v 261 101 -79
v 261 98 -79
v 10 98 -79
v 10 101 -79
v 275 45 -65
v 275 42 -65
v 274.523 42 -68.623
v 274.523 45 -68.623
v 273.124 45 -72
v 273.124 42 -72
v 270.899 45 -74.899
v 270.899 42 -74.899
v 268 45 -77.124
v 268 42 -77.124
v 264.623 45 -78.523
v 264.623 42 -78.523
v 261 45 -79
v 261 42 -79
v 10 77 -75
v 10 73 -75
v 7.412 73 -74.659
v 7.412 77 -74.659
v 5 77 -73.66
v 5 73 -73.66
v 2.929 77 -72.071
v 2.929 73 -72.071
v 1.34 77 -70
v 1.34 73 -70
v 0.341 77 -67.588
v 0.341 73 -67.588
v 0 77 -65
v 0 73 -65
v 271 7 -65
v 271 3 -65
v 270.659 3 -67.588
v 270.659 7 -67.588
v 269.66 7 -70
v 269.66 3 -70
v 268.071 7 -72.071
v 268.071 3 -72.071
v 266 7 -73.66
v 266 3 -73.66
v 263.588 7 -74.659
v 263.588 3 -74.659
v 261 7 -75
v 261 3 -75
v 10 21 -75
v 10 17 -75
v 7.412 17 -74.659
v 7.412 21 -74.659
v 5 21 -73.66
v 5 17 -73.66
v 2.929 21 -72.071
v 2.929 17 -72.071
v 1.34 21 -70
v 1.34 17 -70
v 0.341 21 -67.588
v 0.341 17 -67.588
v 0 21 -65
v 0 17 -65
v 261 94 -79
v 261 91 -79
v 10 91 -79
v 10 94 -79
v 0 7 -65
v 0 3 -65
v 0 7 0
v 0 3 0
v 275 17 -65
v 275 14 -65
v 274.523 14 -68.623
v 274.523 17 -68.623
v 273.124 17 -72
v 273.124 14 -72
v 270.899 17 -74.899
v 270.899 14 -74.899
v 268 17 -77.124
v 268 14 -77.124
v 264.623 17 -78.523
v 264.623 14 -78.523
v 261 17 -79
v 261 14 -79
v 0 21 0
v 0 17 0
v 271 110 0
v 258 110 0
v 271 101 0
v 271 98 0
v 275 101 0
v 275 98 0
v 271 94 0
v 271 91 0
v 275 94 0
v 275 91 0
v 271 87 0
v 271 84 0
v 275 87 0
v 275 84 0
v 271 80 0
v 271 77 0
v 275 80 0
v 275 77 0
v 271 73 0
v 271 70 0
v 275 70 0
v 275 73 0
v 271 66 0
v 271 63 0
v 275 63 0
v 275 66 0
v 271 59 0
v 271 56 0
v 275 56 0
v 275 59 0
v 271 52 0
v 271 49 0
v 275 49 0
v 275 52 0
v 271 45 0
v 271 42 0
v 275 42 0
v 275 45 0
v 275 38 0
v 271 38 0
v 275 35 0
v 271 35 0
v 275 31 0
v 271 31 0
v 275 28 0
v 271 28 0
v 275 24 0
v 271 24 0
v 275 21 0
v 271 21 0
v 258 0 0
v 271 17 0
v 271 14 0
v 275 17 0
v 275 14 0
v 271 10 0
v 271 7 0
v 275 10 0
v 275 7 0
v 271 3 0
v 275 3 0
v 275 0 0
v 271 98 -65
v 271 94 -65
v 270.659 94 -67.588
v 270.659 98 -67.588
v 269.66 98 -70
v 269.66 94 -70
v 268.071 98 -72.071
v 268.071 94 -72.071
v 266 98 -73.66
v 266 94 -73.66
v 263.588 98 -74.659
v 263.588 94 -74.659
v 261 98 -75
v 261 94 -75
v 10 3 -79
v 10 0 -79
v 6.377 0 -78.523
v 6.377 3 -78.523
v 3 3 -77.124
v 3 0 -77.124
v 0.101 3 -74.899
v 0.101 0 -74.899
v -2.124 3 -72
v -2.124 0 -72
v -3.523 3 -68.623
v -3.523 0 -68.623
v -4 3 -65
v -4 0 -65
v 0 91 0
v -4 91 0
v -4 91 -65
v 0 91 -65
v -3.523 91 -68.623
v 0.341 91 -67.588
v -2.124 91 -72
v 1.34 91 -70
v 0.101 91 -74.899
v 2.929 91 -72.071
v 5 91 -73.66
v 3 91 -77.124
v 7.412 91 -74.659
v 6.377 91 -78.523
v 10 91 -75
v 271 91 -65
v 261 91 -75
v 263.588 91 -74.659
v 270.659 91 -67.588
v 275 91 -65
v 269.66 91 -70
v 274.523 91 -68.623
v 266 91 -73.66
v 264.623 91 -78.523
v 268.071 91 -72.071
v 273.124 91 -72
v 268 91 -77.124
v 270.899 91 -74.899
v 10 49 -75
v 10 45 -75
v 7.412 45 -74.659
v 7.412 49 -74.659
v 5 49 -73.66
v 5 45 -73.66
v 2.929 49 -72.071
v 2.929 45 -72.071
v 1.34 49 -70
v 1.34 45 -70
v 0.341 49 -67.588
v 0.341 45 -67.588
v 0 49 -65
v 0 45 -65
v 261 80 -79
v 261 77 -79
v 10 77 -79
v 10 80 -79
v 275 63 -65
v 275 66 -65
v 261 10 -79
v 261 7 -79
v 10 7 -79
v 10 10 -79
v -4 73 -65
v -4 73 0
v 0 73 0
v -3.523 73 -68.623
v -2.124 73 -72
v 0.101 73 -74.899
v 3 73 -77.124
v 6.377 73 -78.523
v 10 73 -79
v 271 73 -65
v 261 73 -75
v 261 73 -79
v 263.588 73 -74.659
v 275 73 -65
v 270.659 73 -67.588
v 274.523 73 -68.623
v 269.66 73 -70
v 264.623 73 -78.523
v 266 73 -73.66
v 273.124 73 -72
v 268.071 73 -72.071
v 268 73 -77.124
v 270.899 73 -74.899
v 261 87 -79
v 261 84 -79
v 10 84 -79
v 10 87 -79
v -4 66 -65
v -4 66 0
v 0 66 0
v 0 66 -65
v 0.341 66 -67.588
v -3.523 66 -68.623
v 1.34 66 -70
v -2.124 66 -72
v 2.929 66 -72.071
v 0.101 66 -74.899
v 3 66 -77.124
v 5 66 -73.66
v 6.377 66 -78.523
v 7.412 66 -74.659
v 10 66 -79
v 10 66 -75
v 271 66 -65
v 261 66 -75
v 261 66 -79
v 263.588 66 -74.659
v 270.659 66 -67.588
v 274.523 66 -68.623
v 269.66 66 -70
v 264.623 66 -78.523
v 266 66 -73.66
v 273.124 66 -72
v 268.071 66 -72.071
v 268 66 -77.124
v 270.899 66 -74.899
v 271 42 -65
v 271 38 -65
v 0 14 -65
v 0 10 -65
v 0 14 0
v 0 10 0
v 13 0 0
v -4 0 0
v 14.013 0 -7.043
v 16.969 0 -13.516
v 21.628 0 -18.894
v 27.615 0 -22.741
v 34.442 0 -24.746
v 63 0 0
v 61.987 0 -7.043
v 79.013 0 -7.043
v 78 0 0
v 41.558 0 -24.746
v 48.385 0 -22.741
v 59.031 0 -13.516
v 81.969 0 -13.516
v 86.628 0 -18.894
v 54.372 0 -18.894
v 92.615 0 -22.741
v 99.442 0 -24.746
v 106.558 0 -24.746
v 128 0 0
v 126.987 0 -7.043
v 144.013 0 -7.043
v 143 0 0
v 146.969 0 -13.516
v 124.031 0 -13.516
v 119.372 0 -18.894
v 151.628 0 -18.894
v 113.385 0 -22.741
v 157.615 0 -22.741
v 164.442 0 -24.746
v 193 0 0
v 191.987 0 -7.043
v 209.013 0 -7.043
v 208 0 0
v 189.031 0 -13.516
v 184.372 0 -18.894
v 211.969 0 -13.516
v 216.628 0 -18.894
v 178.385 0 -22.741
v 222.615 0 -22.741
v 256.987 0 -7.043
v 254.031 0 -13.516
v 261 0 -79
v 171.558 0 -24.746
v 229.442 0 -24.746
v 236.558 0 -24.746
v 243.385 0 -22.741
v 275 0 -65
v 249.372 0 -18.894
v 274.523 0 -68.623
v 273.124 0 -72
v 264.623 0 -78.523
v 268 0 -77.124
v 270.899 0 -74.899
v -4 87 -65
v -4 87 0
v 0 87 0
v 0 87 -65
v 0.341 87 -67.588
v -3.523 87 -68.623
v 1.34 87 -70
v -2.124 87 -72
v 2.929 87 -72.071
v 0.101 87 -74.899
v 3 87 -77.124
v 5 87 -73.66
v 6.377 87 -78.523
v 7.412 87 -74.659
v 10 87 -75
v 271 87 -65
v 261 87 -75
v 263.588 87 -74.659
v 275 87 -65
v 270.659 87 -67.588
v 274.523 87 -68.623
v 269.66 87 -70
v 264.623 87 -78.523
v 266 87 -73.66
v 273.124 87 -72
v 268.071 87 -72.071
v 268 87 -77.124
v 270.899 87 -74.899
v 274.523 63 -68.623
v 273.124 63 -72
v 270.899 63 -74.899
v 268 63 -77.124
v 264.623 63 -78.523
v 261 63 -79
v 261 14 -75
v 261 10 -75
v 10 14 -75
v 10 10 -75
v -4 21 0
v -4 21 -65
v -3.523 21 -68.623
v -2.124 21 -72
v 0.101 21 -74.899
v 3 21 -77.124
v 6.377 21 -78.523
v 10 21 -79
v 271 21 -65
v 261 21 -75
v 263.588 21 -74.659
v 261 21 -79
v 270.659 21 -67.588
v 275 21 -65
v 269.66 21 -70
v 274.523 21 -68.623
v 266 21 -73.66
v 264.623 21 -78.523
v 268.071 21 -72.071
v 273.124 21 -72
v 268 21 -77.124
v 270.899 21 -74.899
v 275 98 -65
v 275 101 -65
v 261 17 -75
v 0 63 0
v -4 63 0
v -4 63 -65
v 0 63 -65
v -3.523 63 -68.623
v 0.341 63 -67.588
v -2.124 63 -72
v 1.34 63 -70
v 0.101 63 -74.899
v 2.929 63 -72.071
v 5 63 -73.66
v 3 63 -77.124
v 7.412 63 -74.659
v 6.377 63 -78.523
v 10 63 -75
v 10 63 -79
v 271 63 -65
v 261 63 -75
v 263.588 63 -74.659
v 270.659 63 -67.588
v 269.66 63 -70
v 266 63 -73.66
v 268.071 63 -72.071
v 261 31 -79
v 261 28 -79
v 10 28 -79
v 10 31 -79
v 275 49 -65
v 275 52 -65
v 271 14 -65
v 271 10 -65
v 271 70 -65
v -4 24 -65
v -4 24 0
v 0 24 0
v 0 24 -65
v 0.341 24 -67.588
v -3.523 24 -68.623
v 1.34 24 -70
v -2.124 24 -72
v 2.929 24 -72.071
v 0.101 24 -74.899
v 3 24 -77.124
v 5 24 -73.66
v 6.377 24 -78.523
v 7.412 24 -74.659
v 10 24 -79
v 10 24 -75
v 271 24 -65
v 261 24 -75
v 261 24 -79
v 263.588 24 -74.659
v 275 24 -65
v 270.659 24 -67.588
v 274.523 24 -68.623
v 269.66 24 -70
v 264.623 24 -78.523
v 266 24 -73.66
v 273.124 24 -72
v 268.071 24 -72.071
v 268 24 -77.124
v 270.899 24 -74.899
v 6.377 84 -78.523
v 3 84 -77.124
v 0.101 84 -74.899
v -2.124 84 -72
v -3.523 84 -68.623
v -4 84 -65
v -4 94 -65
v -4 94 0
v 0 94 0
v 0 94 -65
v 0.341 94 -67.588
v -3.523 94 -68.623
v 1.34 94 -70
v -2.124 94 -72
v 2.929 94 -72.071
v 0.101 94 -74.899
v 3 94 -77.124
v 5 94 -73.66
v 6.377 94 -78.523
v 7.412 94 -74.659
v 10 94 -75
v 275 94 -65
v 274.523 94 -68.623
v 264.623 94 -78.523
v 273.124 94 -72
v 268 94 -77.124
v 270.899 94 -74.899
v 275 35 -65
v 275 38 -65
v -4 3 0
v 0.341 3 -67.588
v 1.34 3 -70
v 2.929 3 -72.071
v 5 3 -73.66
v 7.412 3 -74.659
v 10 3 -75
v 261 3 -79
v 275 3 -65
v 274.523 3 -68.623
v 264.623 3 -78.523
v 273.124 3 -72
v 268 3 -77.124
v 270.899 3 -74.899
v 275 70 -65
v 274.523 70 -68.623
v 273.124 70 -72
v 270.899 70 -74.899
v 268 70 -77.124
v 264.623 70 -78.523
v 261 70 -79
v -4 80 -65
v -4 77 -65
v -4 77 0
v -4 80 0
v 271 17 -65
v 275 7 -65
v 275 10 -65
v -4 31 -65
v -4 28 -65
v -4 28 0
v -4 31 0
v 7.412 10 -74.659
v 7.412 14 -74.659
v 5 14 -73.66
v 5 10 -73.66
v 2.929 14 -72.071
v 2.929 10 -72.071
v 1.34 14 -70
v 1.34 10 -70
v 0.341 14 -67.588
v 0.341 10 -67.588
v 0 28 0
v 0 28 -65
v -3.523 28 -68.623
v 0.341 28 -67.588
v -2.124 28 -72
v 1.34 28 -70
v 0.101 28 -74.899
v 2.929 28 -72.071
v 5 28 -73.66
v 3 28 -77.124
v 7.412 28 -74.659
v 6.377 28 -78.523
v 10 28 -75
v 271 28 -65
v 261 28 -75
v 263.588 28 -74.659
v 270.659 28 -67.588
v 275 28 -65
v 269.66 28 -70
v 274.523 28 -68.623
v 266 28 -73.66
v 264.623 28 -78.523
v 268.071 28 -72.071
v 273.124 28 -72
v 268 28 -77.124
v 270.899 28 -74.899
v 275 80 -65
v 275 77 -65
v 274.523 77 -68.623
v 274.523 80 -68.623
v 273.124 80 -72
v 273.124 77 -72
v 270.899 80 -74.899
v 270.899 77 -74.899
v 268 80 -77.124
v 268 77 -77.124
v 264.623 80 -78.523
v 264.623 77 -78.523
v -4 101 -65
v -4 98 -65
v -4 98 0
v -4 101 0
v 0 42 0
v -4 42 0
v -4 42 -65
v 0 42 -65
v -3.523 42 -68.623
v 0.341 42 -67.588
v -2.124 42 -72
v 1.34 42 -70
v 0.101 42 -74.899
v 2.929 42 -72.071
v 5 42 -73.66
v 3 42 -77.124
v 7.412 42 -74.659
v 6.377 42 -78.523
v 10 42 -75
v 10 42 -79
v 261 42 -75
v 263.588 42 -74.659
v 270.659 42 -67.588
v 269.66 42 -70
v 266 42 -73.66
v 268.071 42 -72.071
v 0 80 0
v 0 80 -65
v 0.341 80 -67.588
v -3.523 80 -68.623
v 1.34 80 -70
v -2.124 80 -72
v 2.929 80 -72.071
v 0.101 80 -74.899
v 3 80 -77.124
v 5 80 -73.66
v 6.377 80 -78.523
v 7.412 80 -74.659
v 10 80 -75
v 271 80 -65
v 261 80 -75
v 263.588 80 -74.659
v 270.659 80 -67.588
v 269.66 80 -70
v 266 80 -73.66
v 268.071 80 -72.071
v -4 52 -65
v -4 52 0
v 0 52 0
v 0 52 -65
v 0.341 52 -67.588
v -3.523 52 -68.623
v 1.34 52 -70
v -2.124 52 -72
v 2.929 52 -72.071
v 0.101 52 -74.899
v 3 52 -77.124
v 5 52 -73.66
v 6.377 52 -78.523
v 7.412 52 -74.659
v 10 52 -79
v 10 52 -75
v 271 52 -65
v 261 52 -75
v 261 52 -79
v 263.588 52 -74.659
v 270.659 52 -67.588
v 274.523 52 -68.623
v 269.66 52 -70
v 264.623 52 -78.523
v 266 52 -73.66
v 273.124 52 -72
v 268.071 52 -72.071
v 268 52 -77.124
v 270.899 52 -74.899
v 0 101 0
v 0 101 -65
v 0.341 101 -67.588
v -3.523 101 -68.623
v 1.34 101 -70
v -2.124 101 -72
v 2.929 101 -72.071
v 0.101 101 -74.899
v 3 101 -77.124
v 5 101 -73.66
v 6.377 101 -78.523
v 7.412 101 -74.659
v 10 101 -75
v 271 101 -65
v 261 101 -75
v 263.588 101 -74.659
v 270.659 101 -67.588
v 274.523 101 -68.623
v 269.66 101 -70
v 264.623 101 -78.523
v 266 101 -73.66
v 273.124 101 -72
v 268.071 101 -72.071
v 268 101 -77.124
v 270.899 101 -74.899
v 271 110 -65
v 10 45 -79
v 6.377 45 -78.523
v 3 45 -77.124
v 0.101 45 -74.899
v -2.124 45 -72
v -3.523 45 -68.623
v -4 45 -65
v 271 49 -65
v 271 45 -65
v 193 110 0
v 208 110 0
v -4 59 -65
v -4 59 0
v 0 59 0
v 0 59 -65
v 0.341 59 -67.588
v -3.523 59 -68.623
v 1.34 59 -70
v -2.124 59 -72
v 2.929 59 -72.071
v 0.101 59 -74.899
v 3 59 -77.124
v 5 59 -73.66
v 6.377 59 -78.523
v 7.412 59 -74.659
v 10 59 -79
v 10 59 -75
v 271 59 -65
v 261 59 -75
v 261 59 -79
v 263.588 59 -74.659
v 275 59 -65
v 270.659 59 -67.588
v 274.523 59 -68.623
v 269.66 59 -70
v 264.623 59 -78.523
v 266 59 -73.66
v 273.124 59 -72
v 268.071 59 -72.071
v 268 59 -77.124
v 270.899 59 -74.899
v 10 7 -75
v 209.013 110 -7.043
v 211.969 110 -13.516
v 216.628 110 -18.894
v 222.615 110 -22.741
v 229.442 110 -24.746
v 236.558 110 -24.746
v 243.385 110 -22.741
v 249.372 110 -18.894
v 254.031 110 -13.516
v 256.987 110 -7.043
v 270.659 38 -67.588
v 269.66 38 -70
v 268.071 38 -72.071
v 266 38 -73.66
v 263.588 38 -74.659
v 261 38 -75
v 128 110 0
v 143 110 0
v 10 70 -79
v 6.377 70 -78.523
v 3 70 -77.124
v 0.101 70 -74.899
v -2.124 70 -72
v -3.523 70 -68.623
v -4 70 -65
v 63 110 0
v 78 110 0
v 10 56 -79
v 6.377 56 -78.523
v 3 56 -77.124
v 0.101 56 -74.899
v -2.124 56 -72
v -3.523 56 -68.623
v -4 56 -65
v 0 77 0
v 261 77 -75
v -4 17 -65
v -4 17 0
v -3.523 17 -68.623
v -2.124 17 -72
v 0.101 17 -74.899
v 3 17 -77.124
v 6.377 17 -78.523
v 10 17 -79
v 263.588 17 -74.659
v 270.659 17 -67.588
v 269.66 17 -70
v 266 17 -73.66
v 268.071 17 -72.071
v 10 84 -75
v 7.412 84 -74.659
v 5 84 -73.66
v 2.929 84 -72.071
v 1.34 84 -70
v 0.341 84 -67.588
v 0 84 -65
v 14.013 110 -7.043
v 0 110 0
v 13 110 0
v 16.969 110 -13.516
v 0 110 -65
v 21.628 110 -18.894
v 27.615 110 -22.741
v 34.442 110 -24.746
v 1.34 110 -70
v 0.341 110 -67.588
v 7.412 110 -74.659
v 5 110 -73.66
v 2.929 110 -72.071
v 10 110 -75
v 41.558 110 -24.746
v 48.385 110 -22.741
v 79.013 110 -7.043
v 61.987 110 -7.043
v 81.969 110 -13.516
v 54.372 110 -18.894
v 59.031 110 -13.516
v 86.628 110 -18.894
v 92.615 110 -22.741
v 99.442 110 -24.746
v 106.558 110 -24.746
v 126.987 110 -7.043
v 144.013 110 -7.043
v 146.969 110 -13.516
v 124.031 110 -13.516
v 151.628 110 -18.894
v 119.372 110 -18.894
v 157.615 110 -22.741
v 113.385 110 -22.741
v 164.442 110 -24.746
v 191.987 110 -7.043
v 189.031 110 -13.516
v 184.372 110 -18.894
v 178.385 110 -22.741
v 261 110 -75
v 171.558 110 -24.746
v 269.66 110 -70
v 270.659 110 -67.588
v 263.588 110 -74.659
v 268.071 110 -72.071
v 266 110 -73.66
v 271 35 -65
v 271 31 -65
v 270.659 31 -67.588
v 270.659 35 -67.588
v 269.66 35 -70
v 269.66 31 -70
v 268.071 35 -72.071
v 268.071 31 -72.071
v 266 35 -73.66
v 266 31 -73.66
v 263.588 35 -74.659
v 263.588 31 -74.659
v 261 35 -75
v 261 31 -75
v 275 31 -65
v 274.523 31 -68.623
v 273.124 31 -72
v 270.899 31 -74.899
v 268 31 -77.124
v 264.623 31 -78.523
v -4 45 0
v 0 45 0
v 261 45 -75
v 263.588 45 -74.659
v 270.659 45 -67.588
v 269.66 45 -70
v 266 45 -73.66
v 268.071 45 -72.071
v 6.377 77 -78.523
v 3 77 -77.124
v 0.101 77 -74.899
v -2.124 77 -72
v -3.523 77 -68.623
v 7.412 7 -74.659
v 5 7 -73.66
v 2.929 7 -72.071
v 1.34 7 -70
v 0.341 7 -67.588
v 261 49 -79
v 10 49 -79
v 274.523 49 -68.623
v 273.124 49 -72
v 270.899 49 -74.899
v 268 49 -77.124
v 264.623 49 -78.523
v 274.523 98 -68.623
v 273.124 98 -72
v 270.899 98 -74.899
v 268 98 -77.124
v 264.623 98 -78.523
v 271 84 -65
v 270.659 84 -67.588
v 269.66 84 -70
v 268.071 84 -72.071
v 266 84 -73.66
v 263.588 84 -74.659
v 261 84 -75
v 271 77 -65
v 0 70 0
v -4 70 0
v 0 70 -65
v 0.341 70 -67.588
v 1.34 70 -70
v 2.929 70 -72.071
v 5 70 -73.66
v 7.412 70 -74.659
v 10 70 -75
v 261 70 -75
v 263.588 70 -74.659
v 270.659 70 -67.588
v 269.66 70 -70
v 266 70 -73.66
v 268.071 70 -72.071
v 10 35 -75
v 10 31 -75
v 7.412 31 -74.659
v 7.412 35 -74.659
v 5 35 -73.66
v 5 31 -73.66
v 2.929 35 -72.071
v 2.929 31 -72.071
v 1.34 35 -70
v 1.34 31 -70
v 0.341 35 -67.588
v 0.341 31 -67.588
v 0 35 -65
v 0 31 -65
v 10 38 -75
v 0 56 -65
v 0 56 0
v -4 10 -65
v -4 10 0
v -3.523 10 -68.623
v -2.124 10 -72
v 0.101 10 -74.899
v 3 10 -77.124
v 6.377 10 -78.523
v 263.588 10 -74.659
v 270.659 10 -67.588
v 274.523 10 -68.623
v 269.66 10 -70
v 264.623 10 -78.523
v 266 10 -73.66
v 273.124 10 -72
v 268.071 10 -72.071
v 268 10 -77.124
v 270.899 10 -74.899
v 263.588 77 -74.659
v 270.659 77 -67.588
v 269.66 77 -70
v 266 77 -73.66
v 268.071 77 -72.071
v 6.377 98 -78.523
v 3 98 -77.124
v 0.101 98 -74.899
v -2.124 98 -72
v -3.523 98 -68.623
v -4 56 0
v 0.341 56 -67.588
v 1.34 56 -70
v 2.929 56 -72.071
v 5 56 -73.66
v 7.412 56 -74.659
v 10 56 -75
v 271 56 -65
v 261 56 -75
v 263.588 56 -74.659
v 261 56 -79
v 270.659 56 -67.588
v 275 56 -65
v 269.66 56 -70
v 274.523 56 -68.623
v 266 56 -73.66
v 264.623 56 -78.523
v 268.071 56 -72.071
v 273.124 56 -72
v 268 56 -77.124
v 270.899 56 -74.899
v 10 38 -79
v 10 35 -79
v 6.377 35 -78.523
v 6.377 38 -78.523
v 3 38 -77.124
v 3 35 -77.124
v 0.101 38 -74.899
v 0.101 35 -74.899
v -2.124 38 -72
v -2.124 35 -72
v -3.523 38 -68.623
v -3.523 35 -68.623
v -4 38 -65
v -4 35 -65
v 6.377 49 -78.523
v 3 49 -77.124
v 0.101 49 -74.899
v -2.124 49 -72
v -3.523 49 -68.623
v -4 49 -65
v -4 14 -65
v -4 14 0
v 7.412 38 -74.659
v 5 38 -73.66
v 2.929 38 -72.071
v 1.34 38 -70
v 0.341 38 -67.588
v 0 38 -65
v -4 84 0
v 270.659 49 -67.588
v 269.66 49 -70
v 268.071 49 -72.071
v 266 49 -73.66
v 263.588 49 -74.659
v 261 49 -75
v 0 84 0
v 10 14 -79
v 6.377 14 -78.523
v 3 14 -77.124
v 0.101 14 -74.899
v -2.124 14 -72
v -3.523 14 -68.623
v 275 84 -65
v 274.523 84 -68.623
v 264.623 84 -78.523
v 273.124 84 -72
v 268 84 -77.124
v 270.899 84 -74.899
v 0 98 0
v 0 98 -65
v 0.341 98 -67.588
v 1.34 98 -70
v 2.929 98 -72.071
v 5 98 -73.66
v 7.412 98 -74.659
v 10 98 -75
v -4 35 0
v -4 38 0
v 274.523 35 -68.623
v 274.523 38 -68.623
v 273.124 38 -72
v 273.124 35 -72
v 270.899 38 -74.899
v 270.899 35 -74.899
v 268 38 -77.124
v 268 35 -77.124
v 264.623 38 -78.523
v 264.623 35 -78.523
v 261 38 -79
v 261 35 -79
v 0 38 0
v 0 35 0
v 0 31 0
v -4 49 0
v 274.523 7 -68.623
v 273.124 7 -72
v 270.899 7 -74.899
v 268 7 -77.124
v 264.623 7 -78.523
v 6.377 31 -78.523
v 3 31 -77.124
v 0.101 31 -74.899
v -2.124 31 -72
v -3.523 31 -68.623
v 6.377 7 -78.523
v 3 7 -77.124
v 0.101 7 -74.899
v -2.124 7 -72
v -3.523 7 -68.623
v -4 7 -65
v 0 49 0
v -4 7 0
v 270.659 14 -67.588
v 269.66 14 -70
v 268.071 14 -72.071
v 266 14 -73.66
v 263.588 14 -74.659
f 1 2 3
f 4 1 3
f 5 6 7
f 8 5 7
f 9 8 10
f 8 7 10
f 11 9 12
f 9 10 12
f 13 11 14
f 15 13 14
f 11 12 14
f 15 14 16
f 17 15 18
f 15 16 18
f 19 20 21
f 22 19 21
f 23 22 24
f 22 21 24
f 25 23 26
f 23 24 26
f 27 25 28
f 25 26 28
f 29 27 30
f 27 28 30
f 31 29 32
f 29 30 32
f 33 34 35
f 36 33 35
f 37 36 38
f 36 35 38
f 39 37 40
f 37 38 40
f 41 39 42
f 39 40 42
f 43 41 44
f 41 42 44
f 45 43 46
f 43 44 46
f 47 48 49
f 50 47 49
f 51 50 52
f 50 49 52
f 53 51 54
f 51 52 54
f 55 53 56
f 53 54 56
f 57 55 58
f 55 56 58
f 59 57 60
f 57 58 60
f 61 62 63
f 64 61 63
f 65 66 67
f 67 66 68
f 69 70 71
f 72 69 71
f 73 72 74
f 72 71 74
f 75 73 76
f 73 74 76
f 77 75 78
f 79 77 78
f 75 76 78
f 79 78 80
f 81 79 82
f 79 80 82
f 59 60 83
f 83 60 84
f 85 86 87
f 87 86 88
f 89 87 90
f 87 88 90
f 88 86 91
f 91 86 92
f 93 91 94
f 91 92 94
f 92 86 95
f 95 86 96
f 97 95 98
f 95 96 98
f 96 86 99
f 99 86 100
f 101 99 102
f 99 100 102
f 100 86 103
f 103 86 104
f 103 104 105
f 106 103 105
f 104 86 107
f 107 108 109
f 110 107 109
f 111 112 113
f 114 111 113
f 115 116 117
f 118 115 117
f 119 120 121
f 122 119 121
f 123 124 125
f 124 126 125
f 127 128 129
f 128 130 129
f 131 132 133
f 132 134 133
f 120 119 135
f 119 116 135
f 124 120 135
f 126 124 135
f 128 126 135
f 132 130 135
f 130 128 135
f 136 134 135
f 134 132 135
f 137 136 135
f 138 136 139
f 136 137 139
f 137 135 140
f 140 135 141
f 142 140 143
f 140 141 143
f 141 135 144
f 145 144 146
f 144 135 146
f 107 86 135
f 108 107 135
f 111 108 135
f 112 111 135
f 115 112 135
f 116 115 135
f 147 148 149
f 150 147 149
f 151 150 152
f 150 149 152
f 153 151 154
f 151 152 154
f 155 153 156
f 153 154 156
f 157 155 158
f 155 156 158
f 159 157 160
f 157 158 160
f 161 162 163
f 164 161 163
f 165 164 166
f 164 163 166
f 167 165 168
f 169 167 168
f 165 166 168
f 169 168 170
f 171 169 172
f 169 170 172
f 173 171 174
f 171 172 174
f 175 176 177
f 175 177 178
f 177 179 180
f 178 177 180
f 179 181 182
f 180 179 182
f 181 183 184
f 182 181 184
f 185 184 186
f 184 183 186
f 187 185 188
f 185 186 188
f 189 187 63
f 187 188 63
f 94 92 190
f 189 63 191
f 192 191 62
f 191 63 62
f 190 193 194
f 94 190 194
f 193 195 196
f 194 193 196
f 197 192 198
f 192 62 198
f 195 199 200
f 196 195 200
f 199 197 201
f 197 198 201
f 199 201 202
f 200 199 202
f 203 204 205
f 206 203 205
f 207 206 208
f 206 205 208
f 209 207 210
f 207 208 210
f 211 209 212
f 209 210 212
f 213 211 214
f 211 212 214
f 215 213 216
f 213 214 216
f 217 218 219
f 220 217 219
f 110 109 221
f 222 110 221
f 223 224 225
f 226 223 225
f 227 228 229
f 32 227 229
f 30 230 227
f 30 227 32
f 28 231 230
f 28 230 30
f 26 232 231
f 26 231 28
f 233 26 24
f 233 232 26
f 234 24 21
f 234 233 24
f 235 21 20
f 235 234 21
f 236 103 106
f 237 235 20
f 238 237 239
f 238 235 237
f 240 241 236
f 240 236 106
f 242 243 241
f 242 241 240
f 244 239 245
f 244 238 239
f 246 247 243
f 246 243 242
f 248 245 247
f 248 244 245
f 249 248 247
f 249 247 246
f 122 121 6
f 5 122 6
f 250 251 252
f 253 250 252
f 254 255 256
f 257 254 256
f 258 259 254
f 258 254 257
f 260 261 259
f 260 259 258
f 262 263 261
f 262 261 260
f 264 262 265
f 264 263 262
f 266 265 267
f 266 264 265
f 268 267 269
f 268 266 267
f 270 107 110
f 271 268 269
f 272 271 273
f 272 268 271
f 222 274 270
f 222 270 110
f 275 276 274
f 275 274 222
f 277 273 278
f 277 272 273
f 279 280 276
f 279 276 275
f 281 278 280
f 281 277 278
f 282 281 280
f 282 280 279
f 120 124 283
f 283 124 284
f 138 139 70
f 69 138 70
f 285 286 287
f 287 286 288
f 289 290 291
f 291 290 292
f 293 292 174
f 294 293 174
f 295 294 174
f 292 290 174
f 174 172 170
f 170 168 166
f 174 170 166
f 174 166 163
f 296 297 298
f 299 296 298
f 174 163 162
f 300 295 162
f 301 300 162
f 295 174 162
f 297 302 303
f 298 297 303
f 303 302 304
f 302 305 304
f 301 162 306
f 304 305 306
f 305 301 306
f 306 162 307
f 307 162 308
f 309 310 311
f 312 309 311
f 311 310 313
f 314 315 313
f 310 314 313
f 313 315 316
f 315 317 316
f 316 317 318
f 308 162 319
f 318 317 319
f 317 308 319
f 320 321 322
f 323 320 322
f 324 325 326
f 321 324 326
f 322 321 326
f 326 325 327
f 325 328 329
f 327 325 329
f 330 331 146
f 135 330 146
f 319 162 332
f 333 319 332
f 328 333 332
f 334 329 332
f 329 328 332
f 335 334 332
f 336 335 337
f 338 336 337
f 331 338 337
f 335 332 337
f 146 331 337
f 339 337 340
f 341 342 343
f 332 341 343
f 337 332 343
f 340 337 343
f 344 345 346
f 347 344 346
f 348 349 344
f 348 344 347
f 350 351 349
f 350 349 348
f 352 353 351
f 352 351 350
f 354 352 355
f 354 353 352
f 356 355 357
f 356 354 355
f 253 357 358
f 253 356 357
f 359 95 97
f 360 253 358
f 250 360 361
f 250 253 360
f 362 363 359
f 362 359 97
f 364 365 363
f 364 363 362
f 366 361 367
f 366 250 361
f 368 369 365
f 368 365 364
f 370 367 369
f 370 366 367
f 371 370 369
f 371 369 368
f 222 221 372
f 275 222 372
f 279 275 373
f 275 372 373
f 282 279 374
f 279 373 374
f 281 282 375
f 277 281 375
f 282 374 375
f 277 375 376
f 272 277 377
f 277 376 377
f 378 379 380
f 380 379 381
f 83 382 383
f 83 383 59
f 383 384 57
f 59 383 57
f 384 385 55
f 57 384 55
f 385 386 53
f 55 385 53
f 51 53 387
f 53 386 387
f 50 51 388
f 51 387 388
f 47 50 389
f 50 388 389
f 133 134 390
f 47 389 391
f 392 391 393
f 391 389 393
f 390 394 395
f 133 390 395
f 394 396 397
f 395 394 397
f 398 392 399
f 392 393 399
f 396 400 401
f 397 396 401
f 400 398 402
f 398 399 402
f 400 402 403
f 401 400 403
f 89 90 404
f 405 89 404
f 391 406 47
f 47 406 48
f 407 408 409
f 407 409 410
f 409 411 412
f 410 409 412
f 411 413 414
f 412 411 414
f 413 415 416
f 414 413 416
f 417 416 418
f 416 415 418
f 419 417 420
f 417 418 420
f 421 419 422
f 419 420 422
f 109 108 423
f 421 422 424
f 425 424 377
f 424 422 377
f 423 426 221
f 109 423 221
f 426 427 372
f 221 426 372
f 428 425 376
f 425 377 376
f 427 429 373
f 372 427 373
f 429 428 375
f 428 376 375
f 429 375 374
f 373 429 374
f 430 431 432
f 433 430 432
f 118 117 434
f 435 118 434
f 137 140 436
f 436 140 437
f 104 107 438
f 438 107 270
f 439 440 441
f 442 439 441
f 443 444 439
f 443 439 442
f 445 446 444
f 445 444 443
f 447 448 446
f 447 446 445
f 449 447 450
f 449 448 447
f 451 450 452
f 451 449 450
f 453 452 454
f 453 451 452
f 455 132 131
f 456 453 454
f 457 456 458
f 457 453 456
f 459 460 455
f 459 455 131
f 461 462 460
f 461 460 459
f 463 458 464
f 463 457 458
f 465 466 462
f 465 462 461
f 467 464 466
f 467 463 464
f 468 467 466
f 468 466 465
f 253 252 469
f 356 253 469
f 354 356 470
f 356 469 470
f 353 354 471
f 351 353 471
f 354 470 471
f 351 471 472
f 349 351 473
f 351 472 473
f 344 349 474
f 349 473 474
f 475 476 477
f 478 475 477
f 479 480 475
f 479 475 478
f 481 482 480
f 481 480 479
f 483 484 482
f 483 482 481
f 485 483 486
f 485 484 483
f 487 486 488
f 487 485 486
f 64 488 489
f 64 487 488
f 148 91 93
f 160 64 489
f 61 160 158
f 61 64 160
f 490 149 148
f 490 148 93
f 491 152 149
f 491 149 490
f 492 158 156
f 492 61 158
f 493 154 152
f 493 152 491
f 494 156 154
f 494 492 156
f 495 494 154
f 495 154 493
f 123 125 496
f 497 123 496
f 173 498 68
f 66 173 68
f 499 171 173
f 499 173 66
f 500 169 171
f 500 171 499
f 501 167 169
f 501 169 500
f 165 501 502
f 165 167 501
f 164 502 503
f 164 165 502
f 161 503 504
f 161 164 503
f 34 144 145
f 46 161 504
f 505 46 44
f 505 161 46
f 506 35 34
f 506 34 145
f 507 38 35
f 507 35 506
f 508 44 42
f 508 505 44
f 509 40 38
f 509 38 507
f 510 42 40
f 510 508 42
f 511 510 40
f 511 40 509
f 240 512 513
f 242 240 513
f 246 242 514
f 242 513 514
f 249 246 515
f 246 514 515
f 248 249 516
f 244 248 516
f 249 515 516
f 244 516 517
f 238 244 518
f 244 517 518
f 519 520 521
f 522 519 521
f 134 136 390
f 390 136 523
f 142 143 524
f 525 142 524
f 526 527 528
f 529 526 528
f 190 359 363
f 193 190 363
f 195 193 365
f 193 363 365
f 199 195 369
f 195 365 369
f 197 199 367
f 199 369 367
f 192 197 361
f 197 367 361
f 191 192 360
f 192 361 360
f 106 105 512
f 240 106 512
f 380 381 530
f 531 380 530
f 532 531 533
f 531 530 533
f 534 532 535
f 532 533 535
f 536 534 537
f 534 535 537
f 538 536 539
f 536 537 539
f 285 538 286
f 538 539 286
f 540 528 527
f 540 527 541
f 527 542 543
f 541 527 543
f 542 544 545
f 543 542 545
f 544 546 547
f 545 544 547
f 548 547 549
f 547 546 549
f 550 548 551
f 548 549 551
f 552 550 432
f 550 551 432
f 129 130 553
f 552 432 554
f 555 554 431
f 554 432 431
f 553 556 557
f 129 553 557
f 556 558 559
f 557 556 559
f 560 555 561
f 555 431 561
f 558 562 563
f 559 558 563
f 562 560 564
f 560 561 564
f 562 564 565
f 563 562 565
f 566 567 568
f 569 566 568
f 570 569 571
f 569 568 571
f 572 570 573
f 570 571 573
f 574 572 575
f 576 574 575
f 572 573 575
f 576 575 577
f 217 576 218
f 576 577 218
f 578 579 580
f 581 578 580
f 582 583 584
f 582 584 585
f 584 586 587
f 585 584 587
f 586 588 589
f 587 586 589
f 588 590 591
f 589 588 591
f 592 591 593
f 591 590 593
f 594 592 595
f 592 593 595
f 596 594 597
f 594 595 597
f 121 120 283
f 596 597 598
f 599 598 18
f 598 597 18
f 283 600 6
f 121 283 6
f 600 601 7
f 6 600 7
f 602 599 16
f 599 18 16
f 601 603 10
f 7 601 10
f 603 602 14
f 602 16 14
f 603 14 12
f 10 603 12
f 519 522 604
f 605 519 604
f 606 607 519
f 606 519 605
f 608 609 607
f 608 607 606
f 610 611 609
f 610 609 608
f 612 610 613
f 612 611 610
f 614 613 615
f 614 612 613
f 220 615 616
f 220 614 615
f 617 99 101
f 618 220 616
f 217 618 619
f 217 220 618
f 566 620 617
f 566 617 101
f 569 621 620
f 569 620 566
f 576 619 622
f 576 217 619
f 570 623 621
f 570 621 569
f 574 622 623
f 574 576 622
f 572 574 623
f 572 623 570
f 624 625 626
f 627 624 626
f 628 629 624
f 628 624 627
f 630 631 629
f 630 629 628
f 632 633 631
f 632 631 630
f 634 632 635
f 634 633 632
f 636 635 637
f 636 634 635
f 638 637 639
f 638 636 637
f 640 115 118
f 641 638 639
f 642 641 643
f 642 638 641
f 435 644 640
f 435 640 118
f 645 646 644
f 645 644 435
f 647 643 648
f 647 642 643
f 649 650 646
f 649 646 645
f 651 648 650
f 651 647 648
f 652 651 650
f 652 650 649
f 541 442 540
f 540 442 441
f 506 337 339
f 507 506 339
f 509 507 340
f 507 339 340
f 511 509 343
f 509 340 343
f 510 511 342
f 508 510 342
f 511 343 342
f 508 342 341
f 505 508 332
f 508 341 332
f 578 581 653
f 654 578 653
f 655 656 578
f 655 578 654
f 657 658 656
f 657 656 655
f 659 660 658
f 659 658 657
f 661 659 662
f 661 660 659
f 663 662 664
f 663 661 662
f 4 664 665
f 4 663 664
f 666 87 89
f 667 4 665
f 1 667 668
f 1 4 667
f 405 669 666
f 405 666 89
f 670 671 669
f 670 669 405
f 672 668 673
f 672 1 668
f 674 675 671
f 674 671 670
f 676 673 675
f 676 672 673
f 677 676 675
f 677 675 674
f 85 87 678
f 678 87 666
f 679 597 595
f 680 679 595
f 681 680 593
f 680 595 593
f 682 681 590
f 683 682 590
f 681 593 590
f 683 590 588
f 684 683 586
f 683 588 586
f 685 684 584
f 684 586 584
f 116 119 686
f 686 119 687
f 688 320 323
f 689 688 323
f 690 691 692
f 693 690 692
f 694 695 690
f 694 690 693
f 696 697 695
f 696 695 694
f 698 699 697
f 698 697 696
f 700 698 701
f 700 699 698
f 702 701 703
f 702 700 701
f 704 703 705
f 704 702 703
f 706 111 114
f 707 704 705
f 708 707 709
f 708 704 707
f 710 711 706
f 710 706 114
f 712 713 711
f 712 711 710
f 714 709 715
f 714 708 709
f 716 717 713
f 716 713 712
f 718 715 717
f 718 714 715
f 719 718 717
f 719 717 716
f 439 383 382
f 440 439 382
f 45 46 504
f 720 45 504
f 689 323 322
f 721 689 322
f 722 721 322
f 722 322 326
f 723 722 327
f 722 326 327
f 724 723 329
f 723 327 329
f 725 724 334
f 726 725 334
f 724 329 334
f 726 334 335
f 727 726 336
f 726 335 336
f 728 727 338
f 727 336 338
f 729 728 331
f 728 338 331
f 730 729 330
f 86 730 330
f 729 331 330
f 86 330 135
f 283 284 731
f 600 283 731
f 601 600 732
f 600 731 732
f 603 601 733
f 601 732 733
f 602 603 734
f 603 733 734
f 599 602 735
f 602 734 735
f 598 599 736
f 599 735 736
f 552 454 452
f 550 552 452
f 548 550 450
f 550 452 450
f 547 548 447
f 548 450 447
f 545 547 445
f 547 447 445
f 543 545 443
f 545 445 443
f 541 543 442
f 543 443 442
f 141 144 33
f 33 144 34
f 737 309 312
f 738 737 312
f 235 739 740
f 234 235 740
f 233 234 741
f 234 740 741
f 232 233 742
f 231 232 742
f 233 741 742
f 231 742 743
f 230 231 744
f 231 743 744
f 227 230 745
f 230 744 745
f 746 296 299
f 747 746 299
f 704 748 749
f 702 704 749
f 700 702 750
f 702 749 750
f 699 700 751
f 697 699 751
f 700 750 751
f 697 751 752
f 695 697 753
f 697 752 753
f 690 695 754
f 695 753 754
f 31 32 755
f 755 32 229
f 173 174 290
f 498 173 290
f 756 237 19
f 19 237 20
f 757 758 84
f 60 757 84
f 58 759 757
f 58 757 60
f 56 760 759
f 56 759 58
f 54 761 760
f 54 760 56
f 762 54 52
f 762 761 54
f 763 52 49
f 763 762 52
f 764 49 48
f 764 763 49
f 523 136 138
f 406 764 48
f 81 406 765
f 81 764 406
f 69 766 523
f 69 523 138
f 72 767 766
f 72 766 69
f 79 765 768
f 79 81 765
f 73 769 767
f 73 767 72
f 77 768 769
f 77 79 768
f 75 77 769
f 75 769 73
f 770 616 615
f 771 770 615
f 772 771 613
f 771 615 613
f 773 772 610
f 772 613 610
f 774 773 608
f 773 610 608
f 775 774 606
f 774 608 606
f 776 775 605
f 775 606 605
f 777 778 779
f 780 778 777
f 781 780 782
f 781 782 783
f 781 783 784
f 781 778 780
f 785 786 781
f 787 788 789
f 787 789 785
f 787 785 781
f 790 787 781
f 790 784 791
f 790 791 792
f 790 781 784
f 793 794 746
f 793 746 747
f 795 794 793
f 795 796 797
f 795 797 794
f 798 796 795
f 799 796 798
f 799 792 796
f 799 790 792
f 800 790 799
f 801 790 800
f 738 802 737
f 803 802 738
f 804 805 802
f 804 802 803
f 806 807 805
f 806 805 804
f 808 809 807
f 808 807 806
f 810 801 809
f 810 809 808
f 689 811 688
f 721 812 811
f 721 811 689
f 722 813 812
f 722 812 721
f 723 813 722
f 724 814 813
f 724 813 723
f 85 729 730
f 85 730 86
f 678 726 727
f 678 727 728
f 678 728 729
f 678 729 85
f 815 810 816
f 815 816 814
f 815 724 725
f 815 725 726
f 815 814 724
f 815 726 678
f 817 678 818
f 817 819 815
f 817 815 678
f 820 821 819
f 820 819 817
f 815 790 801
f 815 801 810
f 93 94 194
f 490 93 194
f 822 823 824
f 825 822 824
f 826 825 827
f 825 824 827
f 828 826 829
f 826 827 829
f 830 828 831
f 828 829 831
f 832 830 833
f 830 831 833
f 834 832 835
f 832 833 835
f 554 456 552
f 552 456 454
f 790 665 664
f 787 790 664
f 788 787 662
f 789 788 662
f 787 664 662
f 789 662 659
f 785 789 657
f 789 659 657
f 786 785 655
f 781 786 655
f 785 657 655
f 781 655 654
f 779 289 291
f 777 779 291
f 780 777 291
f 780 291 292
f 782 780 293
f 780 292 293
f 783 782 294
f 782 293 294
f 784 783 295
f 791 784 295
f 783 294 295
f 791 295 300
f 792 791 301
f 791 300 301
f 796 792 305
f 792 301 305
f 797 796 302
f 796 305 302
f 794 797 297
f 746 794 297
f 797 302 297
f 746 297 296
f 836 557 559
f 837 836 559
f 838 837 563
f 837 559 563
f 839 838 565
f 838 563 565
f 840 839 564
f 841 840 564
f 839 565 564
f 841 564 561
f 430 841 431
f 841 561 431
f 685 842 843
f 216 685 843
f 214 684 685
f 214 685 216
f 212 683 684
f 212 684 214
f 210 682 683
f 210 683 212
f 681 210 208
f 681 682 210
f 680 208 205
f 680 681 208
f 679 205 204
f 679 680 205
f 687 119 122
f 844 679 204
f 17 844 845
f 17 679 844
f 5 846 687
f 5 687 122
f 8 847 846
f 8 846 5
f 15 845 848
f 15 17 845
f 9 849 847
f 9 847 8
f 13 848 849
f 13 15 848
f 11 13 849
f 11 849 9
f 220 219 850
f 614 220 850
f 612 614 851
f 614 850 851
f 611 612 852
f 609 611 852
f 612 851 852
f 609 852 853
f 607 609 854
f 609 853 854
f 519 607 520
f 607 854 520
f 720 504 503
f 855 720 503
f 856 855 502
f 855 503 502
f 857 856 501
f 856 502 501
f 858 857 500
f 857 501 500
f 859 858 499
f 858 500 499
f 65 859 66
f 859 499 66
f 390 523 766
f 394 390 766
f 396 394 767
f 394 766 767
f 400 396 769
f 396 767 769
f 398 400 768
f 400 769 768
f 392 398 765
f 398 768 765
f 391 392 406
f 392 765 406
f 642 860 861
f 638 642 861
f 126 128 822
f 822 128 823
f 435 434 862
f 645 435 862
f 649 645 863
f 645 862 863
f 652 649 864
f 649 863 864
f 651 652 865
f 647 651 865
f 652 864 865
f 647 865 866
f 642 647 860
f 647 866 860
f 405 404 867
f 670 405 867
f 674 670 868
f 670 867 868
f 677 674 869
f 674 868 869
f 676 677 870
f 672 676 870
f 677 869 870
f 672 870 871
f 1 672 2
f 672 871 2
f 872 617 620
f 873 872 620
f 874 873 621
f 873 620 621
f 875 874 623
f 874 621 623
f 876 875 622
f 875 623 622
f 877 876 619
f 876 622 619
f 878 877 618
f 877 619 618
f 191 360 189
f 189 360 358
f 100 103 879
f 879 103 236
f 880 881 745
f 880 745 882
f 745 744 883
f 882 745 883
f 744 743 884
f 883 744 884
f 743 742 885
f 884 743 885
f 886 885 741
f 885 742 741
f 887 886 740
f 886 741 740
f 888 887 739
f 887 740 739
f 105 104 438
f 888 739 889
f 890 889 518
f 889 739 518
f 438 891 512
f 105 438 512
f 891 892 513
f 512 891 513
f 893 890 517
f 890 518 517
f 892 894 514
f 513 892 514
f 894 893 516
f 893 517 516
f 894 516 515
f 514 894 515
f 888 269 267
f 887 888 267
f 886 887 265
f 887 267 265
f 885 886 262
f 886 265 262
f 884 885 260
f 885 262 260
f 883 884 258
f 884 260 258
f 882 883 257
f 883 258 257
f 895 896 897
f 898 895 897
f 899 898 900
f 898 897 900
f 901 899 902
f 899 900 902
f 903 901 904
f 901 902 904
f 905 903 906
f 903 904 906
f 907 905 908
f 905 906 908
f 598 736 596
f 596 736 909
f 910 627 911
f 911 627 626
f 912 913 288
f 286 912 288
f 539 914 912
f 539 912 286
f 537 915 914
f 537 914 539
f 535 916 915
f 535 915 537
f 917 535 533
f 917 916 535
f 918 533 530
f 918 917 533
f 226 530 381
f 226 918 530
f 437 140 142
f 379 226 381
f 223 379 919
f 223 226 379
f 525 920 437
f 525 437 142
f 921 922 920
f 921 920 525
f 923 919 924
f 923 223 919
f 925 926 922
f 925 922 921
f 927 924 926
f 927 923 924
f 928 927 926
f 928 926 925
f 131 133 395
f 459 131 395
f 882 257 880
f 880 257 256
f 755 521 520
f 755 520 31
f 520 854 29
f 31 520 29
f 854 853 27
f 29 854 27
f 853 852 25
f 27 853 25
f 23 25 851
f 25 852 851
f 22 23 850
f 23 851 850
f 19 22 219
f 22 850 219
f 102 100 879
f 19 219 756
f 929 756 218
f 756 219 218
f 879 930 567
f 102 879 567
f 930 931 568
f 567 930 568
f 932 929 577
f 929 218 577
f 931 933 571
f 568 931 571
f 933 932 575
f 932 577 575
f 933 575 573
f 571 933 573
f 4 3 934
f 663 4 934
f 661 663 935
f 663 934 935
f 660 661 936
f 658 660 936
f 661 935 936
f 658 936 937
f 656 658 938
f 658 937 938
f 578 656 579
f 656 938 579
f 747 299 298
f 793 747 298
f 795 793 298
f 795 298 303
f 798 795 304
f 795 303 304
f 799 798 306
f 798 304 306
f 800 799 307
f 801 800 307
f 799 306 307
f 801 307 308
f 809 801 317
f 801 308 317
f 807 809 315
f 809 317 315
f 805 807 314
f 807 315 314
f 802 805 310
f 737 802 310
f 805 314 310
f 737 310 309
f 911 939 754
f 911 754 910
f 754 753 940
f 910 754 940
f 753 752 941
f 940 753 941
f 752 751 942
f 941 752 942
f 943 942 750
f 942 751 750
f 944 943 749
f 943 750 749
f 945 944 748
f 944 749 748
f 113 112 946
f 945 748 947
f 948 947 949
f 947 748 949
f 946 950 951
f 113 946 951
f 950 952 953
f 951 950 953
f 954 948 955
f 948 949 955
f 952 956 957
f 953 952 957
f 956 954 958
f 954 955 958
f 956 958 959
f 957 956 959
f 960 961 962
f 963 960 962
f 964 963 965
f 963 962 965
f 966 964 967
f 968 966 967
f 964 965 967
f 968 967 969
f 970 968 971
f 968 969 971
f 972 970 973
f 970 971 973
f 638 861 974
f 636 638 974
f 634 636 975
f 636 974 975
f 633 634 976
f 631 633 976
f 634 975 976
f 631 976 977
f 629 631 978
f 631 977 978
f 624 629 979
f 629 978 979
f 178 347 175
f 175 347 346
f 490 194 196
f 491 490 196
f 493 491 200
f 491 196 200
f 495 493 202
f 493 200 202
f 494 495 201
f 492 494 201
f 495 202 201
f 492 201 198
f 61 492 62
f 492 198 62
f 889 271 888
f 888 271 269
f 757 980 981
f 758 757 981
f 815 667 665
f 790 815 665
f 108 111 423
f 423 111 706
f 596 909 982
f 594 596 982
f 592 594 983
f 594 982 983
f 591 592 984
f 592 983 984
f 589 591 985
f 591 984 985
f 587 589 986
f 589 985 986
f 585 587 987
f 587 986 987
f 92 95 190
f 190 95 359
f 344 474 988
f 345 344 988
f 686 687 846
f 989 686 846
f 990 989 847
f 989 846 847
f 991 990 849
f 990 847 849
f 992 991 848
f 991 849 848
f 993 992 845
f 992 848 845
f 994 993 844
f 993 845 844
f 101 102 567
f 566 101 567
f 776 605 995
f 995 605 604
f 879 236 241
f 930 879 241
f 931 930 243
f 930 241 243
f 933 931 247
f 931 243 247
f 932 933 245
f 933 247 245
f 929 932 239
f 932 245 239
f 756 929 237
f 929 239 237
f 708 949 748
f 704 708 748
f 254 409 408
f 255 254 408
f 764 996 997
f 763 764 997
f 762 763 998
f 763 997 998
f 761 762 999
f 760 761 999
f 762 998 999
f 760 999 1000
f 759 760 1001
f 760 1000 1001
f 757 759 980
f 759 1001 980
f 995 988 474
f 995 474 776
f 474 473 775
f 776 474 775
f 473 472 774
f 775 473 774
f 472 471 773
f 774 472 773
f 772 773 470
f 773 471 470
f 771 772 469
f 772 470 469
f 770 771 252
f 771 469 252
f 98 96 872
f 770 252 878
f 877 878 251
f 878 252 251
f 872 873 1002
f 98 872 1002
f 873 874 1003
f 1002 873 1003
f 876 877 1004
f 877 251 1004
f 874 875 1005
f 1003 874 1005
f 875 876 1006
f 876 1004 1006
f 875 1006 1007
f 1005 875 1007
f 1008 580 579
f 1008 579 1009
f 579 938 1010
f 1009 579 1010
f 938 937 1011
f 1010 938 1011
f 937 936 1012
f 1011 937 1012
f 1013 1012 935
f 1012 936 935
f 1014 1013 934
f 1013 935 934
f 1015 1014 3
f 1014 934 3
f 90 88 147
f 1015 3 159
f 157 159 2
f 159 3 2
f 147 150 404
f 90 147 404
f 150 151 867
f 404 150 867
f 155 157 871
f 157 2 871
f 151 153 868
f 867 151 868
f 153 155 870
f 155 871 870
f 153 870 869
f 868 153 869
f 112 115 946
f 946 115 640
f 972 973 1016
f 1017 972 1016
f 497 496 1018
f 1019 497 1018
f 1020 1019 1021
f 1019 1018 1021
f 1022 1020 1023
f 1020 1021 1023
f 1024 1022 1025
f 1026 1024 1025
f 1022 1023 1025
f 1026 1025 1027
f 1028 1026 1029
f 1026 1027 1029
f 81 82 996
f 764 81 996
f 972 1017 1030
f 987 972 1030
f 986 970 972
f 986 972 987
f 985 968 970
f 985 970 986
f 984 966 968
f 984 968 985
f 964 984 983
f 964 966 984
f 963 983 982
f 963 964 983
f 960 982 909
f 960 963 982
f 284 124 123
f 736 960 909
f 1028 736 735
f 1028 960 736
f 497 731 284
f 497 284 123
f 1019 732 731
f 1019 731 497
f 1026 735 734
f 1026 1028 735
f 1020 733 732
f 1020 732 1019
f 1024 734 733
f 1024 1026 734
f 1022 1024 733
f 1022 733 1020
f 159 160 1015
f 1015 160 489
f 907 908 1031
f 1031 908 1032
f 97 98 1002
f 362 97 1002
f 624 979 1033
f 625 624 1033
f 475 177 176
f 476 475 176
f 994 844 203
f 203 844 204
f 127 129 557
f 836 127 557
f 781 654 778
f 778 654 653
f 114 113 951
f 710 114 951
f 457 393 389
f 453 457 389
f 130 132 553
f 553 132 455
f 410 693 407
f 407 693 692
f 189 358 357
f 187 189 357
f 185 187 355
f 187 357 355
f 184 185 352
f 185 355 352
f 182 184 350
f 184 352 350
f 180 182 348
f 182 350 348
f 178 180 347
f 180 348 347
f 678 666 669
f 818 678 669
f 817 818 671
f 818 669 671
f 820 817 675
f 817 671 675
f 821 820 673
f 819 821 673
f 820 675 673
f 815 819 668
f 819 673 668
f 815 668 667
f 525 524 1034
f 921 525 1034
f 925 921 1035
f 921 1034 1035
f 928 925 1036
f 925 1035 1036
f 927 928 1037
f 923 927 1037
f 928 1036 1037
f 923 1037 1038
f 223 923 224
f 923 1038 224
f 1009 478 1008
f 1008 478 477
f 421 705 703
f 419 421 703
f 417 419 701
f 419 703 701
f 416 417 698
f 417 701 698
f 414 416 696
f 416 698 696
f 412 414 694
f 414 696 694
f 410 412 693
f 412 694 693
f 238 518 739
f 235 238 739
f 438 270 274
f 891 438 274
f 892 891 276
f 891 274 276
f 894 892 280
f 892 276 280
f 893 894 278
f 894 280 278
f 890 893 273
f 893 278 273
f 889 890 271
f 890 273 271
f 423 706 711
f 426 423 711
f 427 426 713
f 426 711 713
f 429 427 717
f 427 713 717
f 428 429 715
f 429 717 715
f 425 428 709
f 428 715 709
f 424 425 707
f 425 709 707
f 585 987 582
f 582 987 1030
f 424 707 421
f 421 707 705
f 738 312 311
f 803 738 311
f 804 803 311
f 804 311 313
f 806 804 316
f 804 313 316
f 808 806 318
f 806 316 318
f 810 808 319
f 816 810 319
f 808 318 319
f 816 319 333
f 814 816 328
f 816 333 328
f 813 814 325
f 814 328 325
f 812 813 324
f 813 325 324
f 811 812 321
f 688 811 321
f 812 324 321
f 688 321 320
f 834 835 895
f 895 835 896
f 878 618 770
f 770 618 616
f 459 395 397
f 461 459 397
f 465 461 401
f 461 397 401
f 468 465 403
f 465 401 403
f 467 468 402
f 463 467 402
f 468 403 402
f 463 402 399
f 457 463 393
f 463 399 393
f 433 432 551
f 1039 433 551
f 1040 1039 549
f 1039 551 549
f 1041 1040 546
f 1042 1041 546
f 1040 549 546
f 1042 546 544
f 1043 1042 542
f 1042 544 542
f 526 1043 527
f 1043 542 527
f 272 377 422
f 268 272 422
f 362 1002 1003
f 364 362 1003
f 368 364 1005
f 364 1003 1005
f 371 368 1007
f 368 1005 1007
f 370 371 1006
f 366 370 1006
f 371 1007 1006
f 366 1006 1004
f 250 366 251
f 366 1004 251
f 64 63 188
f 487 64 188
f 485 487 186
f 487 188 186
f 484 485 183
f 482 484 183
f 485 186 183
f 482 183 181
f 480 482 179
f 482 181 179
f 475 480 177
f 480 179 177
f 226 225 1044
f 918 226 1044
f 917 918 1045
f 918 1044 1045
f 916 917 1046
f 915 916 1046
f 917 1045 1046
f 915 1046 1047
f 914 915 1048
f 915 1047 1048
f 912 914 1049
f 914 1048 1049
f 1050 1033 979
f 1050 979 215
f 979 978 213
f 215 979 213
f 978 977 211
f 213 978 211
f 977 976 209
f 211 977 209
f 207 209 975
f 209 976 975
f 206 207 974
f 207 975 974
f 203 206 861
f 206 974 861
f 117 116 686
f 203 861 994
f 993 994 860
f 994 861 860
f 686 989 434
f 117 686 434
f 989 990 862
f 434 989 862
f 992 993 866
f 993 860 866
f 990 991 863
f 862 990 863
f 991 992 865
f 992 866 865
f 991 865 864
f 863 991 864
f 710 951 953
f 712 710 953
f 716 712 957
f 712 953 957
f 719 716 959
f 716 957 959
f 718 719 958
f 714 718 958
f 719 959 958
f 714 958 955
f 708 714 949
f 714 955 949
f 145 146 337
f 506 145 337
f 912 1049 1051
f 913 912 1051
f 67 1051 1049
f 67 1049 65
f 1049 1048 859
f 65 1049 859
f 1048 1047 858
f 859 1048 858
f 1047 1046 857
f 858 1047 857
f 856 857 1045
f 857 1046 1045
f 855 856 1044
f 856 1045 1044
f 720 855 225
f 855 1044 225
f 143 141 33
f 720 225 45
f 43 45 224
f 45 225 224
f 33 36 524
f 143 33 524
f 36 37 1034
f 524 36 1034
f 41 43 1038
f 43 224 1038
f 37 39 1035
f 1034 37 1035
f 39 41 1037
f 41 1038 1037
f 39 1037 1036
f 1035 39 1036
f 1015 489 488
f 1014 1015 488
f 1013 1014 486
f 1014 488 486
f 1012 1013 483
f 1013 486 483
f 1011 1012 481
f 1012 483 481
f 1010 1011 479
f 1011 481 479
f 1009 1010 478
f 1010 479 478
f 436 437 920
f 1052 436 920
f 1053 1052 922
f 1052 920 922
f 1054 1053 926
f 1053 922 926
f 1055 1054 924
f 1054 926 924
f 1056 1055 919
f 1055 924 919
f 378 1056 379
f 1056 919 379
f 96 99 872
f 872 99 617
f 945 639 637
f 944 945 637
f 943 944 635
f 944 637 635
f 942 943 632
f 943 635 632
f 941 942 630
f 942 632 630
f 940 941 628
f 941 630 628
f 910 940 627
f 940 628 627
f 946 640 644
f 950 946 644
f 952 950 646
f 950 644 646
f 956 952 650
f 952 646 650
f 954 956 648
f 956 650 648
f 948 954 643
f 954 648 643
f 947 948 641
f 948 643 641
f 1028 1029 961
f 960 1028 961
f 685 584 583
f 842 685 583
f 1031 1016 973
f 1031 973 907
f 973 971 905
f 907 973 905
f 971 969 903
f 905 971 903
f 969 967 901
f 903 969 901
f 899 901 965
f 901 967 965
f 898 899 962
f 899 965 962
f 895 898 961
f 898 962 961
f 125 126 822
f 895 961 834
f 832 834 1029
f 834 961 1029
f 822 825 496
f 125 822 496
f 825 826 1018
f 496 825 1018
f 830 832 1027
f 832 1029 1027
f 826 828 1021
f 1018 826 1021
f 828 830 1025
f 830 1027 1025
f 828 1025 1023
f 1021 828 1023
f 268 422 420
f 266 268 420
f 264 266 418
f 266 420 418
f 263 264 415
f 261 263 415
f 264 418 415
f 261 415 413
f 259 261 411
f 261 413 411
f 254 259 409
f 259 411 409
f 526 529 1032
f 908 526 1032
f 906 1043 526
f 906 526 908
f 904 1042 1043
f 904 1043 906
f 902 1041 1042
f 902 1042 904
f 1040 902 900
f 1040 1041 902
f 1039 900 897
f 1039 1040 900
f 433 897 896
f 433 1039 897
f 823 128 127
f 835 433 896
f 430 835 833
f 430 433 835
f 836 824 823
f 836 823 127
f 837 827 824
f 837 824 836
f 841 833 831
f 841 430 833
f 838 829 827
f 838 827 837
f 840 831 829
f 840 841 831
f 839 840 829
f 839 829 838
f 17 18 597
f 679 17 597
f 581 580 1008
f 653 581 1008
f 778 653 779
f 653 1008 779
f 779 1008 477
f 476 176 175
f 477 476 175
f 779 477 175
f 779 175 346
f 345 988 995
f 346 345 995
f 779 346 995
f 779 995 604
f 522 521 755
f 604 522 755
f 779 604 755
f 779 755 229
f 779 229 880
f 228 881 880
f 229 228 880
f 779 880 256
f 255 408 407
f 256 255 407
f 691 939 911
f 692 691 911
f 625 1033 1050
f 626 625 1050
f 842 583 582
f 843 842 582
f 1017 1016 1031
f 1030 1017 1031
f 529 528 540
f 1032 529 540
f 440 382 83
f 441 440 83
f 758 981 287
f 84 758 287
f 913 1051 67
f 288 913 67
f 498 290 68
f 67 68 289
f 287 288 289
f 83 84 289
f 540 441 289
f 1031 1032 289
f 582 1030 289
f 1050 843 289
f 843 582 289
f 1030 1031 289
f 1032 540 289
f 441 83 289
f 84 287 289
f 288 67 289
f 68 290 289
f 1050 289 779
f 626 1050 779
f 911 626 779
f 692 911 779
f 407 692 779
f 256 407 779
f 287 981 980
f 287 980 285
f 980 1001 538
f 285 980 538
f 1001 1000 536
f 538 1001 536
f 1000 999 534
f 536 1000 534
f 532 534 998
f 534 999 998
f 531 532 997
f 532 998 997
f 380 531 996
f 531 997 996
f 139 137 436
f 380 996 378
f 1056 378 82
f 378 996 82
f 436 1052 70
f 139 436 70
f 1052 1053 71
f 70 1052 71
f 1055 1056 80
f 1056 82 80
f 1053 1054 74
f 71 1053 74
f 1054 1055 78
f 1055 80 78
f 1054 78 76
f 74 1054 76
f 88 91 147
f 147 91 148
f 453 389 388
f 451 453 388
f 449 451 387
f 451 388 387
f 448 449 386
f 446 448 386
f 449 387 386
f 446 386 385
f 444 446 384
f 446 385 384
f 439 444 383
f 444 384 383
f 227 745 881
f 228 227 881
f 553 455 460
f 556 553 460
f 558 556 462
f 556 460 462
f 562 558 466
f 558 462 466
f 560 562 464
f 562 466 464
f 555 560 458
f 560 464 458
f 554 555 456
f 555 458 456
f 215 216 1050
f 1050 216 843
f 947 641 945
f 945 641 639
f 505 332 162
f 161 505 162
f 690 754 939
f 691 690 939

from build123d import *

# Parameters (mm, degrees)
BOSS_EXTRUDE1_DEPTH = 110
BOSS_EXTRUDE2_DEPTH = 3
LPATTERN1_COUNT     = 15
LPATTERN1_PITCH     = 7


with BuildPart() as part:
    # Sketch1 → Boss-Extrude1 (new body)
    with BuildSketch(Plane(origin=(0, 0, 0), x_dir=(1, 0, 0), z_dir=(0, 1, 0))):
        with BuildLine():
            Line((0, 0), (13, 0))
            ThreePointArc((13, 0), (38, 25), (63, 0))
            Line((63, 0), (78, 0))
            ThreePointArc((78, 0), (103, 25), (128, 0))
            Line((128, 0), (143, 0))
            ThreePointArc((143, 0), (168, 25), (193, 0))
            Line((193, 0), (208, 0))
            ThreePointArc((208, 0), (233, 25), (258, 0))
            Line((258, 0), (271, 0))
            Line((271, 0), (271, 65))
            ThreePointArc((271, 65), (268.071067812, 72.071067812), (261, 75))
            Line((261, 75), (10, 75))
            ThreePointArc((10, 75), (2.928932188, 72.071067812), (0, 65))
            Line((0, 65), (0, 0))
        make_face()
    extrude(amount=BOSS_EXTRUDE1_DEPTH)

    # Sketch2 → Boss-Extrude2 (add)
    with BuildSketch(Plane(origin=(0, 0, 0), x_dir=(1, 0, 0), z_dir=(0, 1, 0))):
        with BuildLine():
            Line((275, 0), (275, 65))
            ThreePointArc((275, 65), (270.899494937, 74.899494937), (261, 79))
            Line((261, 79), (10, 79))
            ThreePointArc((10, 79), (0.100505063, 74.899494937), (-4, 65))
            Line((-4, 65), (-4, 0))
            Line((-4, 0), (0, 0))
            Line((0, 0), (0, 65))
            ThreePointArc((0, 65), (2.928932188, 72.071067812), (10, 75))
            Line((10, 75), (261, 75))
            ThreePointArc((261, 75), (268.071067812, 72.071067812), (271, 65))
            Line((271, 65), (271, 0))
            Line((271, 0), (275, 0))
        make_face()
    boss_extrude2 = extrude(amount=BOSS_EXTRUDE2_DEPTH)

    # LPattern1: Boss-Extrude2 ×15
    with Locations(*[(0, i * LPATTERN1_PITCH, 0) for i in range(1, LPATTERN1_COUNT)]):
        add(boss_extrude2)


solid = part.part
